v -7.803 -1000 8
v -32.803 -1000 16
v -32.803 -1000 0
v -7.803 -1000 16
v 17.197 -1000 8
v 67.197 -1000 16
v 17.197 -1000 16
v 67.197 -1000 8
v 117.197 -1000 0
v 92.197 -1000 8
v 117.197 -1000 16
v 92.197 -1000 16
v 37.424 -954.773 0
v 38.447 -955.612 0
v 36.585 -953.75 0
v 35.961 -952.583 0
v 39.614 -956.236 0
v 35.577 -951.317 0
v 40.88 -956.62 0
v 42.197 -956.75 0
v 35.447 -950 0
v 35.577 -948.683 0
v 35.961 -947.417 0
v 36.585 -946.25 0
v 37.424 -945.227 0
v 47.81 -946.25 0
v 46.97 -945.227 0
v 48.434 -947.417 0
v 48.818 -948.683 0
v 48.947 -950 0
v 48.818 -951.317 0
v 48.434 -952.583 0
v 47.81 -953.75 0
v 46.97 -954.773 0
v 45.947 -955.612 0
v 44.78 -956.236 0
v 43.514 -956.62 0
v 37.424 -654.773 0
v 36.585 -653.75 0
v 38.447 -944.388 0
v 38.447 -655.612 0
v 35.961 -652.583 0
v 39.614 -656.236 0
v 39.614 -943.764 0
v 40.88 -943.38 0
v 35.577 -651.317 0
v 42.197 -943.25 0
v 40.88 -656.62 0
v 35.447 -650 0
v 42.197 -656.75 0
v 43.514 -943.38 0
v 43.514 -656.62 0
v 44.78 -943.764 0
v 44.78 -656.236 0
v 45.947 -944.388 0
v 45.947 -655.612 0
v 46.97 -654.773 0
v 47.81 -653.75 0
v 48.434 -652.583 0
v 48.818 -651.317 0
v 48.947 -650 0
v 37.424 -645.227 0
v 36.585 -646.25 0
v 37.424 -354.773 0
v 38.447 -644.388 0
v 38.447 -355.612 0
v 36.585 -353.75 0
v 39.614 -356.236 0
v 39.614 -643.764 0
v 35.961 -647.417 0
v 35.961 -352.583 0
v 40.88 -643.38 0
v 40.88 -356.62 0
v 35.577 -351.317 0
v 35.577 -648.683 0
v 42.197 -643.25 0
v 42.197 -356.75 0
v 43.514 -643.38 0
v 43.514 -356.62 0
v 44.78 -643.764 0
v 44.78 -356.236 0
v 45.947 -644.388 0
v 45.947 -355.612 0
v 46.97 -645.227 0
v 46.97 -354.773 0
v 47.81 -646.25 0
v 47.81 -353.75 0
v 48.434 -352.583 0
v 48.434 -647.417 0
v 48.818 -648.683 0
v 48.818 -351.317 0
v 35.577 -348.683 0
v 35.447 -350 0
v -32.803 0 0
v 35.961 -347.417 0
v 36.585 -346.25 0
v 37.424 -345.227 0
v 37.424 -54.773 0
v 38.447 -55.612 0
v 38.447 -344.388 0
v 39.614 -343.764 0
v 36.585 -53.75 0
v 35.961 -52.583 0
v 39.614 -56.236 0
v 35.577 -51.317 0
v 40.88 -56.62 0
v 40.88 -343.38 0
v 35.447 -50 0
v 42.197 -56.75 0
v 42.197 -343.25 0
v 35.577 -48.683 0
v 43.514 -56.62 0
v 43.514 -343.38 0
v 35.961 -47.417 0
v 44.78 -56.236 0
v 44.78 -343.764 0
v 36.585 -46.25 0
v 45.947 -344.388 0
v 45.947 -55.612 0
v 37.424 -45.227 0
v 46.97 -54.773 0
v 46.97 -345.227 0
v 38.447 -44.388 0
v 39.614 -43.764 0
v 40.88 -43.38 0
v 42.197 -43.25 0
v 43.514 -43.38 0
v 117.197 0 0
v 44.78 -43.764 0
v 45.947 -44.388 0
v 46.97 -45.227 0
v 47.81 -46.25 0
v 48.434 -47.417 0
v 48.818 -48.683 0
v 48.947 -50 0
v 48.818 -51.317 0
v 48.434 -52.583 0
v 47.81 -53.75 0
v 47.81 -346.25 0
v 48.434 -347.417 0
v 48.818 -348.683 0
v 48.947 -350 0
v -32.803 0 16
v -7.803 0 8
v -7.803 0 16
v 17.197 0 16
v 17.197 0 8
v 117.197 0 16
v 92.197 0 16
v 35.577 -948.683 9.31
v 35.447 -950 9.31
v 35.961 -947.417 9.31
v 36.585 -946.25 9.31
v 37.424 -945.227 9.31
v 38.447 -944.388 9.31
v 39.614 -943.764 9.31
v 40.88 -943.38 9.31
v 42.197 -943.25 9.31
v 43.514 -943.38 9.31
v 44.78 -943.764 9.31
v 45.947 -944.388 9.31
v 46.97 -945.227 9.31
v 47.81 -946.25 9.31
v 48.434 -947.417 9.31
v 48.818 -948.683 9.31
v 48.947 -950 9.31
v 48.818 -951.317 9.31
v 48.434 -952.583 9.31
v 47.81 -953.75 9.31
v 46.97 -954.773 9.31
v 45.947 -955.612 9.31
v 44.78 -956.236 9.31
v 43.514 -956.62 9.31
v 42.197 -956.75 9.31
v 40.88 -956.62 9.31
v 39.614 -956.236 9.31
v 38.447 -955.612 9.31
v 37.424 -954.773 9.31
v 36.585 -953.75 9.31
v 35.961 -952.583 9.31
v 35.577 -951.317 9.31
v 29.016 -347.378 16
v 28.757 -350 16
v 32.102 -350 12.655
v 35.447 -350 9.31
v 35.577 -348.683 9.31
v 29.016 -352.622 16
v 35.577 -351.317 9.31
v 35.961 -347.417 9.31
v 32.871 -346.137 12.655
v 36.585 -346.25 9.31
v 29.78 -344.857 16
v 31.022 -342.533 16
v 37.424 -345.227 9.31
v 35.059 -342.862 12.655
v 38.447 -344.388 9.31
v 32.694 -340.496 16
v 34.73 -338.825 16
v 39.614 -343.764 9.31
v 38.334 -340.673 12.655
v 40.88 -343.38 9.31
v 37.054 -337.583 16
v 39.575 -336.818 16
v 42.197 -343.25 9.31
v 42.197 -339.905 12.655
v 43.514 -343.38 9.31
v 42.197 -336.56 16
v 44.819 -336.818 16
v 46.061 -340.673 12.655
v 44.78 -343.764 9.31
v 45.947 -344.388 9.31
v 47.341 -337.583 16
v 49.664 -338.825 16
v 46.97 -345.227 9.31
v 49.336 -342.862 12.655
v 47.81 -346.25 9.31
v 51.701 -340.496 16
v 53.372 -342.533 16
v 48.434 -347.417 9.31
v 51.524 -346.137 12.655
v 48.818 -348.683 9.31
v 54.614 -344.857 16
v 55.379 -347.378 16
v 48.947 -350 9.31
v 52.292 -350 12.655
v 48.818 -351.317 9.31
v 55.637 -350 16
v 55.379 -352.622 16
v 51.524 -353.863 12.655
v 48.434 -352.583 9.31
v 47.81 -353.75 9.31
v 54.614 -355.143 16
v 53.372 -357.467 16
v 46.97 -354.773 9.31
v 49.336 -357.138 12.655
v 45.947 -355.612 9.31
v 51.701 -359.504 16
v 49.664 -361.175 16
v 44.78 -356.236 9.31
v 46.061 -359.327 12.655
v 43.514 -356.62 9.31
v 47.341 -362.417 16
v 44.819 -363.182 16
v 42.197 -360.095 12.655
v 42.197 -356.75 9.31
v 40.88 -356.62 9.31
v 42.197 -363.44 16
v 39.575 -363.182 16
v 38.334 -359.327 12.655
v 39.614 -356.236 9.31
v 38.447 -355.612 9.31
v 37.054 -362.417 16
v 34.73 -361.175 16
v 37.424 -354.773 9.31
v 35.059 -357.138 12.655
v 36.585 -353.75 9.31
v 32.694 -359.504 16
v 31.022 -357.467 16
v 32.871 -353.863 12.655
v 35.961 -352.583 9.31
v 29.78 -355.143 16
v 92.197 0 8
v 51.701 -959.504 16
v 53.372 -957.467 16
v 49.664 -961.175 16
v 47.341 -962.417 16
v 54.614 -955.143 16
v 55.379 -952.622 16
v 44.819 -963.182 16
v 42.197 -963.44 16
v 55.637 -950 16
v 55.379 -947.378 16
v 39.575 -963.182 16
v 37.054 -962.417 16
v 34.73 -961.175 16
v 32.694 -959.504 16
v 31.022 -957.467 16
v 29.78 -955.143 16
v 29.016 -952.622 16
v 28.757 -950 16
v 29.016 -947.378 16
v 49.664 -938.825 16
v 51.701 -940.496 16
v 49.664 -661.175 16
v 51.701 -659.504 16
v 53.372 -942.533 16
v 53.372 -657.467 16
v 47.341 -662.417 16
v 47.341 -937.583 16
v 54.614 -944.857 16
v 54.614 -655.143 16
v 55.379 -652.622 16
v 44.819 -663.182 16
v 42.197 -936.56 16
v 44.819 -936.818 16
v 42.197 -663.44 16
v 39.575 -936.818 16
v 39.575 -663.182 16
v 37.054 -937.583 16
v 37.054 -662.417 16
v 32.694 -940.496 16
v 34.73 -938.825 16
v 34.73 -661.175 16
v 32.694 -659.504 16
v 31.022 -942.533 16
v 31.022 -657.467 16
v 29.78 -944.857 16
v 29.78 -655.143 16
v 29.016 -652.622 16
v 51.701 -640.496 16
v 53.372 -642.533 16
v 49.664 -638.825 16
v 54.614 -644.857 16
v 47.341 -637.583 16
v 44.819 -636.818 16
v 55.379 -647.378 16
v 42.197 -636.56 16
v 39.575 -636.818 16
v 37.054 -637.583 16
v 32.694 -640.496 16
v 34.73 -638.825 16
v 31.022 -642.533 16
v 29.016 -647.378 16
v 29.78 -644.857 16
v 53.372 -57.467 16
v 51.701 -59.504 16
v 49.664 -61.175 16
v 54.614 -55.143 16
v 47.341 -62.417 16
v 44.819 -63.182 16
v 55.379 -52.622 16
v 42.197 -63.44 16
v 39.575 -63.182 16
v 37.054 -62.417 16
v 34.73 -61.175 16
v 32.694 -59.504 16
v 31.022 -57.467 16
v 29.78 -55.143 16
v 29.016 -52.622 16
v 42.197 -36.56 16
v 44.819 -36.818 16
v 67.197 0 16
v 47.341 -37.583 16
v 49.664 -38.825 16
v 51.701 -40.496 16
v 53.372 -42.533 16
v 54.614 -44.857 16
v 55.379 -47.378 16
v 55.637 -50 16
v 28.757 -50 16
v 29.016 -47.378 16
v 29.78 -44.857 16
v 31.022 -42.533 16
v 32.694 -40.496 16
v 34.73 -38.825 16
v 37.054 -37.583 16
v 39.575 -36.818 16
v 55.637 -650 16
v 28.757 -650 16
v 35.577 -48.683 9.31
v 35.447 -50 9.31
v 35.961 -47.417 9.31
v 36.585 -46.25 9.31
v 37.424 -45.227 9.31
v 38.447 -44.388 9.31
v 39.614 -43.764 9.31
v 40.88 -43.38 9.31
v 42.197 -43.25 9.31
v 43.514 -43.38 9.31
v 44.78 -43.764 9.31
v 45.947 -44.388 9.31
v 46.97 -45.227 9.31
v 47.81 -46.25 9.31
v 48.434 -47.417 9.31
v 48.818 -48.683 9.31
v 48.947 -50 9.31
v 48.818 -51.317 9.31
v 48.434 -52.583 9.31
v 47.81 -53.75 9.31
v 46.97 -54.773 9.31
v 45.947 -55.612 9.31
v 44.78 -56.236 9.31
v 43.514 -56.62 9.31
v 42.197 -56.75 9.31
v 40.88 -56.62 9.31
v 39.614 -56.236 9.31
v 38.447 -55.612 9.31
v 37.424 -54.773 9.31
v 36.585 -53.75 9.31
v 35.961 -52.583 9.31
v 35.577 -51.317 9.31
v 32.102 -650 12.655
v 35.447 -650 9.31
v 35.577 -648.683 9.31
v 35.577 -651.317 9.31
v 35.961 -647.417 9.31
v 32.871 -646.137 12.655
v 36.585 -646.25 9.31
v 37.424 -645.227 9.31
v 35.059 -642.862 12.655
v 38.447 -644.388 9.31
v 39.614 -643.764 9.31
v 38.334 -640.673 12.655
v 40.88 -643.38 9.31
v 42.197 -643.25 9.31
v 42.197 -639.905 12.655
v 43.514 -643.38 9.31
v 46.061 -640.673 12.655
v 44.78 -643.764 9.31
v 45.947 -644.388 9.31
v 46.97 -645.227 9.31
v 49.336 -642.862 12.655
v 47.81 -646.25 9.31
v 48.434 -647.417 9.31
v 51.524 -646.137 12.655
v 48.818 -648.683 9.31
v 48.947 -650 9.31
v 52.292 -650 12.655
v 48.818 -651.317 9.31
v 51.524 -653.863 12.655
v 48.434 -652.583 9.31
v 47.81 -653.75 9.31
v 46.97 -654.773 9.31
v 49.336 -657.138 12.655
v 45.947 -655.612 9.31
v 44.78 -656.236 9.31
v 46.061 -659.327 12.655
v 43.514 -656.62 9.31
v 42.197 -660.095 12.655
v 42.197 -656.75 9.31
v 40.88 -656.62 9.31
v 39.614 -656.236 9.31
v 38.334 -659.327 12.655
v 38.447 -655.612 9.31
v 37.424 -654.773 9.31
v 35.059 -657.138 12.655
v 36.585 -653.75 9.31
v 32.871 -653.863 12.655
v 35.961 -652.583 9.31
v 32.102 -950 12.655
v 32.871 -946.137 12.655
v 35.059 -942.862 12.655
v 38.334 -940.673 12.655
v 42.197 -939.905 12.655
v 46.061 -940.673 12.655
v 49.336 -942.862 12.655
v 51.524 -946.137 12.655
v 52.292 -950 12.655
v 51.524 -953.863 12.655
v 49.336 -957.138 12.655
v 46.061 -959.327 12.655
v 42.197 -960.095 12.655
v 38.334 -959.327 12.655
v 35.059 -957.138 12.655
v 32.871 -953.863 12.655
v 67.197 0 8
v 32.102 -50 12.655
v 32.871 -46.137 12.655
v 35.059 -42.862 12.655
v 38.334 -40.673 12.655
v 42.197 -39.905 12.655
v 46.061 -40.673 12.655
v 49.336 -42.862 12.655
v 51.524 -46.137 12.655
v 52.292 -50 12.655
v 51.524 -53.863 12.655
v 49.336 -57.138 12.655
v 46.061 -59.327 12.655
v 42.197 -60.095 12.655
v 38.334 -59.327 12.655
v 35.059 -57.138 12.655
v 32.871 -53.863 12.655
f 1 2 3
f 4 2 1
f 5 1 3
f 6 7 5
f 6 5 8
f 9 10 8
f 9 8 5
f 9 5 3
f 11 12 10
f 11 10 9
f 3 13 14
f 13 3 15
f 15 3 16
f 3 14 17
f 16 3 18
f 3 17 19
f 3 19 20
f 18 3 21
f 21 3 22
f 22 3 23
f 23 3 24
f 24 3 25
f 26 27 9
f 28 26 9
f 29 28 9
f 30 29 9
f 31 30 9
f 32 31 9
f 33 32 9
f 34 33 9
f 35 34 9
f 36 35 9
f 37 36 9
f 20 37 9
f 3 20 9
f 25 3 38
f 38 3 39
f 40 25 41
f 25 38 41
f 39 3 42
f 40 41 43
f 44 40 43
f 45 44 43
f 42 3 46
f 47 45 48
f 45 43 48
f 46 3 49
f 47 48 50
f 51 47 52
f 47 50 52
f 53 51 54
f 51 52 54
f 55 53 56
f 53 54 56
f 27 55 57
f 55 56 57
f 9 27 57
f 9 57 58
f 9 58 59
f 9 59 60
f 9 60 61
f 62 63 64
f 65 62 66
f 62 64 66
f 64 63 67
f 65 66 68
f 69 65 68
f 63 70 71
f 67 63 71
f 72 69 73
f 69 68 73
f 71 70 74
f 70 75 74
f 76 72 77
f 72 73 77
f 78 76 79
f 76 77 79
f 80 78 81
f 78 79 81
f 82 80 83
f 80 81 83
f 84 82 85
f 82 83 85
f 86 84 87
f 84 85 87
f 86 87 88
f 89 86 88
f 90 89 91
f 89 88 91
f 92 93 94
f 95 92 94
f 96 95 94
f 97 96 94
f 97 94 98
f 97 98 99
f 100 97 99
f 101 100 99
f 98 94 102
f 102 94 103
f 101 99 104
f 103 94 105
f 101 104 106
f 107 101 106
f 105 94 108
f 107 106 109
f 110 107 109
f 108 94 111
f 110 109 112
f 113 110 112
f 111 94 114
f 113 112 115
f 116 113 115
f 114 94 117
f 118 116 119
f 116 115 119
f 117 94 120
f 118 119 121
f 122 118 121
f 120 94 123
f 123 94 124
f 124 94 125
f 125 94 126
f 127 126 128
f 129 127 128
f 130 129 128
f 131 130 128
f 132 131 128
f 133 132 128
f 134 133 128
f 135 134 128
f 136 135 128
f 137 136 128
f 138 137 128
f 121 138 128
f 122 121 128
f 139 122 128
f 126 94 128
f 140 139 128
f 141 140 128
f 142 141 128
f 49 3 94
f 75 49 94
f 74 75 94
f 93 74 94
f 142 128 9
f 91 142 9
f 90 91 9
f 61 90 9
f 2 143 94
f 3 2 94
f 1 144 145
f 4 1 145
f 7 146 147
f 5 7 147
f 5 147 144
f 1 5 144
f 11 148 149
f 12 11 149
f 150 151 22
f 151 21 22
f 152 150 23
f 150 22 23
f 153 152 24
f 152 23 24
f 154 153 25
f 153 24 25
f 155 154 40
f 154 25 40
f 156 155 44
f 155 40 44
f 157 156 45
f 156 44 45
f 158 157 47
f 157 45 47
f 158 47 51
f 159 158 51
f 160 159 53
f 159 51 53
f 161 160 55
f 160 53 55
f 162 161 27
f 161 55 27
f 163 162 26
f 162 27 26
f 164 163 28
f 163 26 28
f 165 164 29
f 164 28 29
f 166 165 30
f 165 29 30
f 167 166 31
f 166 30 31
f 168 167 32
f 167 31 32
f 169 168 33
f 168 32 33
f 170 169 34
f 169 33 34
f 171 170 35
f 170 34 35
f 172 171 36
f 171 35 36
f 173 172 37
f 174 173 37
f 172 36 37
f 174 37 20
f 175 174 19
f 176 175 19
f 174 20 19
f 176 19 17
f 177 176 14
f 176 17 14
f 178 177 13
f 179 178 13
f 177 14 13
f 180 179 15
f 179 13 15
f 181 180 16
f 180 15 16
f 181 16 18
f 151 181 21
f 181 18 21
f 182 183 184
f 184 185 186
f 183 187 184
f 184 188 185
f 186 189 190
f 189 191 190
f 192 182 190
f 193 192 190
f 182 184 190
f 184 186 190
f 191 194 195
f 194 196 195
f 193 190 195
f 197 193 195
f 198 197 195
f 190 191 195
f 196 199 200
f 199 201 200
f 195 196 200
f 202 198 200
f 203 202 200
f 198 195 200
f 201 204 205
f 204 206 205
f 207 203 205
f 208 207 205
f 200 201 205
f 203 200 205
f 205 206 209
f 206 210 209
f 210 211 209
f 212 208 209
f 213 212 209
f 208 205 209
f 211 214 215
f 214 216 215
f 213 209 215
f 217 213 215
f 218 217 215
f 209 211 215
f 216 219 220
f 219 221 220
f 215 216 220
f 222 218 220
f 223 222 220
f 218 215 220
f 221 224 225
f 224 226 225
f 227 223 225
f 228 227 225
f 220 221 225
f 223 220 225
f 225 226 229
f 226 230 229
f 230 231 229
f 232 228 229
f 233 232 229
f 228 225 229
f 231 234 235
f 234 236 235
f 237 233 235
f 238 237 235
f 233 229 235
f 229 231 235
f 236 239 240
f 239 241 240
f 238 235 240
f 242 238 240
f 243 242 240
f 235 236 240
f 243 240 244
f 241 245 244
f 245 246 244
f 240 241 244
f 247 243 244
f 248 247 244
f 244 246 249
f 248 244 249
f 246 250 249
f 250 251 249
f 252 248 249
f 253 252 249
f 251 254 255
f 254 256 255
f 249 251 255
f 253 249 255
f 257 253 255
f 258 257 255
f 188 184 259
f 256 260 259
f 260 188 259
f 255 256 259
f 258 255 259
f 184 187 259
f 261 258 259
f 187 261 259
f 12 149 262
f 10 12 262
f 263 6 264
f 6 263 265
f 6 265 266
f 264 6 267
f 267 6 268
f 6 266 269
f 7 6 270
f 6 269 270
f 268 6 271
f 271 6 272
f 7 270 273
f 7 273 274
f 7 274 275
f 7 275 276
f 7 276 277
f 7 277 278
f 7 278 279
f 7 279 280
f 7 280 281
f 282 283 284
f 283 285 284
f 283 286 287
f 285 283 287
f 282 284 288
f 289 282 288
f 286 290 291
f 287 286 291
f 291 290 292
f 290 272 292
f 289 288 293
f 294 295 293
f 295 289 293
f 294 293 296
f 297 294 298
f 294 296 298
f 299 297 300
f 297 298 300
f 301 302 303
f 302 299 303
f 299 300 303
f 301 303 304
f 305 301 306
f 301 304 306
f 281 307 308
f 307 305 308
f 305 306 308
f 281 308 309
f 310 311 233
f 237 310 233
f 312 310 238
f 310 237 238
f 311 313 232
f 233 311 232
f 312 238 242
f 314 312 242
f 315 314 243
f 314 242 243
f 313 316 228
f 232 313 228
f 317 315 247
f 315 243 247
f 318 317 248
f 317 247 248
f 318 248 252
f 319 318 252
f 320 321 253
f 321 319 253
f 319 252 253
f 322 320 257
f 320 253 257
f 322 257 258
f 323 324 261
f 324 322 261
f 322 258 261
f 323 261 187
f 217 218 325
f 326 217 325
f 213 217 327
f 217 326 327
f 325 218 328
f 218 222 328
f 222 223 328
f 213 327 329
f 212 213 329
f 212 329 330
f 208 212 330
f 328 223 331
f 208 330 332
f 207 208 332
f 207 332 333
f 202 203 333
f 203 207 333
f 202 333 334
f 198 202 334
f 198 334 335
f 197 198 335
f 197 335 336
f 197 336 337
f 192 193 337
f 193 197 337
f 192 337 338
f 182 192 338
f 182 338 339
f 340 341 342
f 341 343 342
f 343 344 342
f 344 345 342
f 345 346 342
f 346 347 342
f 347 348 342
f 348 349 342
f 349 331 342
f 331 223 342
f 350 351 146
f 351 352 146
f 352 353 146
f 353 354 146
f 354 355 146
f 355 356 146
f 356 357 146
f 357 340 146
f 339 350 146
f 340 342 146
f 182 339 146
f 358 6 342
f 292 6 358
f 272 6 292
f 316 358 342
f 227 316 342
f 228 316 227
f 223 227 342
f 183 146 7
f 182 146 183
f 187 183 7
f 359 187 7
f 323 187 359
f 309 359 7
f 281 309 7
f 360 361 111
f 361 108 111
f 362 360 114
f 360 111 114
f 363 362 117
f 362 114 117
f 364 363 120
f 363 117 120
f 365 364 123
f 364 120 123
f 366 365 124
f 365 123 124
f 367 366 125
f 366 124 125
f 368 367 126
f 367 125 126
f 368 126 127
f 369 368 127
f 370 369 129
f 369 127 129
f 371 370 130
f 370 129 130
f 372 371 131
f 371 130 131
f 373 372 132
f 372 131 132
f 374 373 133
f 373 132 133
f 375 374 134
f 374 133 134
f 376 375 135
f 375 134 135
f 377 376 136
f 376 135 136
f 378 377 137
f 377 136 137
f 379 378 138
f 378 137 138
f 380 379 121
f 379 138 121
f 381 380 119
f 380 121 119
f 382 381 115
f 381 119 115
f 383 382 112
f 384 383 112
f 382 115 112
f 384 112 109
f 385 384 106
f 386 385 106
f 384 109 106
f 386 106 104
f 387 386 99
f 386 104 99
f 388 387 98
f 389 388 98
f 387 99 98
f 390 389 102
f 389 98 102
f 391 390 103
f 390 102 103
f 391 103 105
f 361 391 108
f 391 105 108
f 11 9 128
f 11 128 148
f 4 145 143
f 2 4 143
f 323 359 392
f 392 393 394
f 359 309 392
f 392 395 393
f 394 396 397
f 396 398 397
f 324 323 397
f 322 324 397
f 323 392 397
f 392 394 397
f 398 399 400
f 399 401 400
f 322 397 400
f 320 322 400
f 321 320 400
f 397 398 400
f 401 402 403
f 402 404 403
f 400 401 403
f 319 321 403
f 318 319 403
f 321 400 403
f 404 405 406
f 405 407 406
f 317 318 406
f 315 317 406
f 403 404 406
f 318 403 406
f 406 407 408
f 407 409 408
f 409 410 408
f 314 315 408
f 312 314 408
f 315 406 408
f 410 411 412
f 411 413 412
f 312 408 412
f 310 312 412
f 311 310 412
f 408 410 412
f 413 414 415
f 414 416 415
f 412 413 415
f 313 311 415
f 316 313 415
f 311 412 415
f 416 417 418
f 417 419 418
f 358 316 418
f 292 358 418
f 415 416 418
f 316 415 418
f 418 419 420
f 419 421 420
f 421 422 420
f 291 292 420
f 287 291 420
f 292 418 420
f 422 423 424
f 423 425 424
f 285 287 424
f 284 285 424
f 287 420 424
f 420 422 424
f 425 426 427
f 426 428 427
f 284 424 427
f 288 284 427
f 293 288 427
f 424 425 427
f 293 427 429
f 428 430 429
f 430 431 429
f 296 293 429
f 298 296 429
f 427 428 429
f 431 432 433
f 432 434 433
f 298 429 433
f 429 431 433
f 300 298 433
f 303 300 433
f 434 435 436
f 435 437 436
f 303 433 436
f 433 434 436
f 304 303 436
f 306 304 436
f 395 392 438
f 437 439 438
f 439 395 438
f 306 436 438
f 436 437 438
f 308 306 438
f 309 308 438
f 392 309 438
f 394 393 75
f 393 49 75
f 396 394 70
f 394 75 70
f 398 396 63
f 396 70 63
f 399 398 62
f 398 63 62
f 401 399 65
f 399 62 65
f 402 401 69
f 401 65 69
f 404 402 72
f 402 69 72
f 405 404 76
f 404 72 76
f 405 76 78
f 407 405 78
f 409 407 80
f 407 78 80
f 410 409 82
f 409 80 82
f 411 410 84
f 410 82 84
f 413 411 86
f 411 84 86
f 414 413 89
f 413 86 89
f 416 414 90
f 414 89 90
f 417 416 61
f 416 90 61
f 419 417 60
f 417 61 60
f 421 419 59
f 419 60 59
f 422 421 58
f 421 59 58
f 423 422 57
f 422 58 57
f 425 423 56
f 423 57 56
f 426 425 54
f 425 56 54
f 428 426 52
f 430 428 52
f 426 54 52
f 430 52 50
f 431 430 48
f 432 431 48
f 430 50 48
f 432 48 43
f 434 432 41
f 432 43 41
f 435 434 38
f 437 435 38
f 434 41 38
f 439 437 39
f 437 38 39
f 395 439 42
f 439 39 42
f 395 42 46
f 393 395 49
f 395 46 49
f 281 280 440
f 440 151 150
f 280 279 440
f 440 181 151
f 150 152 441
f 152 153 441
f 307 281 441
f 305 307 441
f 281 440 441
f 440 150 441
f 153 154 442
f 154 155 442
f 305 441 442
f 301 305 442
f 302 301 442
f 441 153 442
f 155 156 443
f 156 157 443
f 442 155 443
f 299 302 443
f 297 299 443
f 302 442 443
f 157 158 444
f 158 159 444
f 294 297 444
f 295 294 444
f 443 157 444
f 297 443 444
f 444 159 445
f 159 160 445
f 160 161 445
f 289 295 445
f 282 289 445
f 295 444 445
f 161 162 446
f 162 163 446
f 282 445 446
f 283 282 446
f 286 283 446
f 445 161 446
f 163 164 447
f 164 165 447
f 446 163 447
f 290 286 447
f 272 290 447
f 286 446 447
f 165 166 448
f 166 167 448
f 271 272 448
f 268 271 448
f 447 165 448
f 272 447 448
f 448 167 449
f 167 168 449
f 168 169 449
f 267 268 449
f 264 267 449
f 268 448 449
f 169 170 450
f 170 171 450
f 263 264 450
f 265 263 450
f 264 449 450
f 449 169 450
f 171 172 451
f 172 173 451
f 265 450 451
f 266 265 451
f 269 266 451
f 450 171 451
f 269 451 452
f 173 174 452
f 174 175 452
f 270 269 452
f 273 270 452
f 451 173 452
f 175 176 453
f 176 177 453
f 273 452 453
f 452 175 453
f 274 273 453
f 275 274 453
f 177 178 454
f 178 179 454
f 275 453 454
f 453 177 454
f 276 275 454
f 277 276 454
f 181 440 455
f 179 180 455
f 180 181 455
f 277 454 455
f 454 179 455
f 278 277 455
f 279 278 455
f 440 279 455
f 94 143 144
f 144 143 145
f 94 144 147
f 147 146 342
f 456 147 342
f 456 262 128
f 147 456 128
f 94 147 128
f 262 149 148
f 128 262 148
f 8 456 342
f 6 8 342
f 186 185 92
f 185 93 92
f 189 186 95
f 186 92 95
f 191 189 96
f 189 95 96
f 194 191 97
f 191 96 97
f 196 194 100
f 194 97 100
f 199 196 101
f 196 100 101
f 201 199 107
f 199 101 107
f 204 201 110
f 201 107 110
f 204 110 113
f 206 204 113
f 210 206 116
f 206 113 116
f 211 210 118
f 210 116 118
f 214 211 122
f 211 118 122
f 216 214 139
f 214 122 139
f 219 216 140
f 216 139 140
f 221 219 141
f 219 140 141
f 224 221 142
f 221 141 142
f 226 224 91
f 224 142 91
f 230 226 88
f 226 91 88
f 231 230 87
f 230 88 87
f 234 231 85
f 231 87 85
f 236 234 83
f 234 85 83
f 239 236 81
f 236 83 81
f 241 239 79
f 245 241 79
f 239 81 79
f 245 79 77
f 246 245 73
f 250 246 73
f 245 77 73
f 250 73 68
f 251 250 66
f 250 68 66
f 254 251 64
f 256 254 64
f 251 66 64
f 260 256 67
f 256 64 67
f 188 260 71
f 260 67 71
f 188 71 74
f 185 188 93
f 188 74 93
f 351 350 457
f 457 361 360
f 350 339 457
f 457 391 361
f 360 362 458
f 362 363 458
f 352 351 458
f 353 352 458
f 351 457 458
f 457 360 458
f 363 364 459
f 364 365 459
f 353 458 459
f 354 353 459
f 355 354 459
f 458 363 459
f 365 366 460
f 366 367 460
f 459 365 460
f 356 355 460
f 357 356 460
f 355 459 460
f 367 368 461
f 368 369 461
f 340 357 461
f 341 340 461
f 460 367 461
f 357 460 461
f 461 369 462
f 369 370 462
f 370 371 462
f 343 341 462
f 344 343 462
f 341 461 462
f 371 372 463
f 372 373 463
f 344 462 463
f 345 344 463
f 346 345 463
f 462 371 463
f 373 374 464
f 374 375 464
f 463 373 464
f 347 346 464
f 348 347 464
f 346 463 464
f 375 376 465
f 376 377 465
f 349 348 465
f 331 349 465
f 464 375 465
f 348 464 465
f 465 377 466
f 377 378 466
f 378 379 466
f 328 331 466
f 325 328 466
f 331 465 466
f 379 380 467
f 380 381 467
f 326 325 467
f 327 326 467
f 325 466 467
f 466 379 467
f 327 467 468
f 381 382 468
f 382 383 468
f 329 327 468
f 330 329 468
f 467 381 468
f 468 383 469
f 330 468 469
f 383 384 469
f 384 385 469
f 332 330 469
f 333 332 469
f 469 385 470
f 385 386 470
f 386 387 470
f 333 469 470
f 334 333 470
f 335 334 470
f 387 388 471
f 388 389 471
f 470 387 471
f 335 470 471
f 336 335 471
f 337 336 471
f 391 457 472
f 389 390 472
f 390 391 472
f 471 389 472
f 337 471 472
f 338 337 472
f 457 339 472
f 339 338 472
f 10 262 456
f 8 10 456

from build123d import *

# Parameters (mm, degrees)
F1_DEPTH       = 1000
F3_D           = 13.5
F3_DEPTH       = 16
F3_CSINK_D     = 26.88
F3_CSINK_ANGLE = 90
F3_TIP         = 4.0558091784


with BuildPart() as f1:
    # F0 (on Front) → F1 (new body)
    with BuildSketch(Plane.XZ):
        Polygon((-32.8026744276, 16), (-32.8026744276, 0), (117.1973255724, 0), (117.1973255724, 16), (92.1973255724, 16), (92.1973255724, 8), (67.1973255724, 8), (67.1973255724, 16), (42.1973255724, 16), (17.1973255724, 16), (17.1973255724, 8), (-7.8026744276, 8), (-7.8026744276, 16), align=None)
    extrude(amount=F1_DEPTH)

    # F3
    with Locations(Plane.XY.offset(16)):
        with Locations((42.1973255724, -50), (42.1973255724, -350), (42.1973255724, -650), (42.1973255724, -950)):
            CounterSinkHole(F3_D / 2, F3_CSINK_D / 2, depth=F3_DEPTH, counter_sink_angle=F3_CSINK_ANGLE)
            with Locations((0, 0, -(F3_DEPTH + F3_TIP / 2))):  # 118° drill point
                Cone(0, F3_D / 2, F3_TIP, mode=Mode.SUBTRACT)


solid = f1.part
